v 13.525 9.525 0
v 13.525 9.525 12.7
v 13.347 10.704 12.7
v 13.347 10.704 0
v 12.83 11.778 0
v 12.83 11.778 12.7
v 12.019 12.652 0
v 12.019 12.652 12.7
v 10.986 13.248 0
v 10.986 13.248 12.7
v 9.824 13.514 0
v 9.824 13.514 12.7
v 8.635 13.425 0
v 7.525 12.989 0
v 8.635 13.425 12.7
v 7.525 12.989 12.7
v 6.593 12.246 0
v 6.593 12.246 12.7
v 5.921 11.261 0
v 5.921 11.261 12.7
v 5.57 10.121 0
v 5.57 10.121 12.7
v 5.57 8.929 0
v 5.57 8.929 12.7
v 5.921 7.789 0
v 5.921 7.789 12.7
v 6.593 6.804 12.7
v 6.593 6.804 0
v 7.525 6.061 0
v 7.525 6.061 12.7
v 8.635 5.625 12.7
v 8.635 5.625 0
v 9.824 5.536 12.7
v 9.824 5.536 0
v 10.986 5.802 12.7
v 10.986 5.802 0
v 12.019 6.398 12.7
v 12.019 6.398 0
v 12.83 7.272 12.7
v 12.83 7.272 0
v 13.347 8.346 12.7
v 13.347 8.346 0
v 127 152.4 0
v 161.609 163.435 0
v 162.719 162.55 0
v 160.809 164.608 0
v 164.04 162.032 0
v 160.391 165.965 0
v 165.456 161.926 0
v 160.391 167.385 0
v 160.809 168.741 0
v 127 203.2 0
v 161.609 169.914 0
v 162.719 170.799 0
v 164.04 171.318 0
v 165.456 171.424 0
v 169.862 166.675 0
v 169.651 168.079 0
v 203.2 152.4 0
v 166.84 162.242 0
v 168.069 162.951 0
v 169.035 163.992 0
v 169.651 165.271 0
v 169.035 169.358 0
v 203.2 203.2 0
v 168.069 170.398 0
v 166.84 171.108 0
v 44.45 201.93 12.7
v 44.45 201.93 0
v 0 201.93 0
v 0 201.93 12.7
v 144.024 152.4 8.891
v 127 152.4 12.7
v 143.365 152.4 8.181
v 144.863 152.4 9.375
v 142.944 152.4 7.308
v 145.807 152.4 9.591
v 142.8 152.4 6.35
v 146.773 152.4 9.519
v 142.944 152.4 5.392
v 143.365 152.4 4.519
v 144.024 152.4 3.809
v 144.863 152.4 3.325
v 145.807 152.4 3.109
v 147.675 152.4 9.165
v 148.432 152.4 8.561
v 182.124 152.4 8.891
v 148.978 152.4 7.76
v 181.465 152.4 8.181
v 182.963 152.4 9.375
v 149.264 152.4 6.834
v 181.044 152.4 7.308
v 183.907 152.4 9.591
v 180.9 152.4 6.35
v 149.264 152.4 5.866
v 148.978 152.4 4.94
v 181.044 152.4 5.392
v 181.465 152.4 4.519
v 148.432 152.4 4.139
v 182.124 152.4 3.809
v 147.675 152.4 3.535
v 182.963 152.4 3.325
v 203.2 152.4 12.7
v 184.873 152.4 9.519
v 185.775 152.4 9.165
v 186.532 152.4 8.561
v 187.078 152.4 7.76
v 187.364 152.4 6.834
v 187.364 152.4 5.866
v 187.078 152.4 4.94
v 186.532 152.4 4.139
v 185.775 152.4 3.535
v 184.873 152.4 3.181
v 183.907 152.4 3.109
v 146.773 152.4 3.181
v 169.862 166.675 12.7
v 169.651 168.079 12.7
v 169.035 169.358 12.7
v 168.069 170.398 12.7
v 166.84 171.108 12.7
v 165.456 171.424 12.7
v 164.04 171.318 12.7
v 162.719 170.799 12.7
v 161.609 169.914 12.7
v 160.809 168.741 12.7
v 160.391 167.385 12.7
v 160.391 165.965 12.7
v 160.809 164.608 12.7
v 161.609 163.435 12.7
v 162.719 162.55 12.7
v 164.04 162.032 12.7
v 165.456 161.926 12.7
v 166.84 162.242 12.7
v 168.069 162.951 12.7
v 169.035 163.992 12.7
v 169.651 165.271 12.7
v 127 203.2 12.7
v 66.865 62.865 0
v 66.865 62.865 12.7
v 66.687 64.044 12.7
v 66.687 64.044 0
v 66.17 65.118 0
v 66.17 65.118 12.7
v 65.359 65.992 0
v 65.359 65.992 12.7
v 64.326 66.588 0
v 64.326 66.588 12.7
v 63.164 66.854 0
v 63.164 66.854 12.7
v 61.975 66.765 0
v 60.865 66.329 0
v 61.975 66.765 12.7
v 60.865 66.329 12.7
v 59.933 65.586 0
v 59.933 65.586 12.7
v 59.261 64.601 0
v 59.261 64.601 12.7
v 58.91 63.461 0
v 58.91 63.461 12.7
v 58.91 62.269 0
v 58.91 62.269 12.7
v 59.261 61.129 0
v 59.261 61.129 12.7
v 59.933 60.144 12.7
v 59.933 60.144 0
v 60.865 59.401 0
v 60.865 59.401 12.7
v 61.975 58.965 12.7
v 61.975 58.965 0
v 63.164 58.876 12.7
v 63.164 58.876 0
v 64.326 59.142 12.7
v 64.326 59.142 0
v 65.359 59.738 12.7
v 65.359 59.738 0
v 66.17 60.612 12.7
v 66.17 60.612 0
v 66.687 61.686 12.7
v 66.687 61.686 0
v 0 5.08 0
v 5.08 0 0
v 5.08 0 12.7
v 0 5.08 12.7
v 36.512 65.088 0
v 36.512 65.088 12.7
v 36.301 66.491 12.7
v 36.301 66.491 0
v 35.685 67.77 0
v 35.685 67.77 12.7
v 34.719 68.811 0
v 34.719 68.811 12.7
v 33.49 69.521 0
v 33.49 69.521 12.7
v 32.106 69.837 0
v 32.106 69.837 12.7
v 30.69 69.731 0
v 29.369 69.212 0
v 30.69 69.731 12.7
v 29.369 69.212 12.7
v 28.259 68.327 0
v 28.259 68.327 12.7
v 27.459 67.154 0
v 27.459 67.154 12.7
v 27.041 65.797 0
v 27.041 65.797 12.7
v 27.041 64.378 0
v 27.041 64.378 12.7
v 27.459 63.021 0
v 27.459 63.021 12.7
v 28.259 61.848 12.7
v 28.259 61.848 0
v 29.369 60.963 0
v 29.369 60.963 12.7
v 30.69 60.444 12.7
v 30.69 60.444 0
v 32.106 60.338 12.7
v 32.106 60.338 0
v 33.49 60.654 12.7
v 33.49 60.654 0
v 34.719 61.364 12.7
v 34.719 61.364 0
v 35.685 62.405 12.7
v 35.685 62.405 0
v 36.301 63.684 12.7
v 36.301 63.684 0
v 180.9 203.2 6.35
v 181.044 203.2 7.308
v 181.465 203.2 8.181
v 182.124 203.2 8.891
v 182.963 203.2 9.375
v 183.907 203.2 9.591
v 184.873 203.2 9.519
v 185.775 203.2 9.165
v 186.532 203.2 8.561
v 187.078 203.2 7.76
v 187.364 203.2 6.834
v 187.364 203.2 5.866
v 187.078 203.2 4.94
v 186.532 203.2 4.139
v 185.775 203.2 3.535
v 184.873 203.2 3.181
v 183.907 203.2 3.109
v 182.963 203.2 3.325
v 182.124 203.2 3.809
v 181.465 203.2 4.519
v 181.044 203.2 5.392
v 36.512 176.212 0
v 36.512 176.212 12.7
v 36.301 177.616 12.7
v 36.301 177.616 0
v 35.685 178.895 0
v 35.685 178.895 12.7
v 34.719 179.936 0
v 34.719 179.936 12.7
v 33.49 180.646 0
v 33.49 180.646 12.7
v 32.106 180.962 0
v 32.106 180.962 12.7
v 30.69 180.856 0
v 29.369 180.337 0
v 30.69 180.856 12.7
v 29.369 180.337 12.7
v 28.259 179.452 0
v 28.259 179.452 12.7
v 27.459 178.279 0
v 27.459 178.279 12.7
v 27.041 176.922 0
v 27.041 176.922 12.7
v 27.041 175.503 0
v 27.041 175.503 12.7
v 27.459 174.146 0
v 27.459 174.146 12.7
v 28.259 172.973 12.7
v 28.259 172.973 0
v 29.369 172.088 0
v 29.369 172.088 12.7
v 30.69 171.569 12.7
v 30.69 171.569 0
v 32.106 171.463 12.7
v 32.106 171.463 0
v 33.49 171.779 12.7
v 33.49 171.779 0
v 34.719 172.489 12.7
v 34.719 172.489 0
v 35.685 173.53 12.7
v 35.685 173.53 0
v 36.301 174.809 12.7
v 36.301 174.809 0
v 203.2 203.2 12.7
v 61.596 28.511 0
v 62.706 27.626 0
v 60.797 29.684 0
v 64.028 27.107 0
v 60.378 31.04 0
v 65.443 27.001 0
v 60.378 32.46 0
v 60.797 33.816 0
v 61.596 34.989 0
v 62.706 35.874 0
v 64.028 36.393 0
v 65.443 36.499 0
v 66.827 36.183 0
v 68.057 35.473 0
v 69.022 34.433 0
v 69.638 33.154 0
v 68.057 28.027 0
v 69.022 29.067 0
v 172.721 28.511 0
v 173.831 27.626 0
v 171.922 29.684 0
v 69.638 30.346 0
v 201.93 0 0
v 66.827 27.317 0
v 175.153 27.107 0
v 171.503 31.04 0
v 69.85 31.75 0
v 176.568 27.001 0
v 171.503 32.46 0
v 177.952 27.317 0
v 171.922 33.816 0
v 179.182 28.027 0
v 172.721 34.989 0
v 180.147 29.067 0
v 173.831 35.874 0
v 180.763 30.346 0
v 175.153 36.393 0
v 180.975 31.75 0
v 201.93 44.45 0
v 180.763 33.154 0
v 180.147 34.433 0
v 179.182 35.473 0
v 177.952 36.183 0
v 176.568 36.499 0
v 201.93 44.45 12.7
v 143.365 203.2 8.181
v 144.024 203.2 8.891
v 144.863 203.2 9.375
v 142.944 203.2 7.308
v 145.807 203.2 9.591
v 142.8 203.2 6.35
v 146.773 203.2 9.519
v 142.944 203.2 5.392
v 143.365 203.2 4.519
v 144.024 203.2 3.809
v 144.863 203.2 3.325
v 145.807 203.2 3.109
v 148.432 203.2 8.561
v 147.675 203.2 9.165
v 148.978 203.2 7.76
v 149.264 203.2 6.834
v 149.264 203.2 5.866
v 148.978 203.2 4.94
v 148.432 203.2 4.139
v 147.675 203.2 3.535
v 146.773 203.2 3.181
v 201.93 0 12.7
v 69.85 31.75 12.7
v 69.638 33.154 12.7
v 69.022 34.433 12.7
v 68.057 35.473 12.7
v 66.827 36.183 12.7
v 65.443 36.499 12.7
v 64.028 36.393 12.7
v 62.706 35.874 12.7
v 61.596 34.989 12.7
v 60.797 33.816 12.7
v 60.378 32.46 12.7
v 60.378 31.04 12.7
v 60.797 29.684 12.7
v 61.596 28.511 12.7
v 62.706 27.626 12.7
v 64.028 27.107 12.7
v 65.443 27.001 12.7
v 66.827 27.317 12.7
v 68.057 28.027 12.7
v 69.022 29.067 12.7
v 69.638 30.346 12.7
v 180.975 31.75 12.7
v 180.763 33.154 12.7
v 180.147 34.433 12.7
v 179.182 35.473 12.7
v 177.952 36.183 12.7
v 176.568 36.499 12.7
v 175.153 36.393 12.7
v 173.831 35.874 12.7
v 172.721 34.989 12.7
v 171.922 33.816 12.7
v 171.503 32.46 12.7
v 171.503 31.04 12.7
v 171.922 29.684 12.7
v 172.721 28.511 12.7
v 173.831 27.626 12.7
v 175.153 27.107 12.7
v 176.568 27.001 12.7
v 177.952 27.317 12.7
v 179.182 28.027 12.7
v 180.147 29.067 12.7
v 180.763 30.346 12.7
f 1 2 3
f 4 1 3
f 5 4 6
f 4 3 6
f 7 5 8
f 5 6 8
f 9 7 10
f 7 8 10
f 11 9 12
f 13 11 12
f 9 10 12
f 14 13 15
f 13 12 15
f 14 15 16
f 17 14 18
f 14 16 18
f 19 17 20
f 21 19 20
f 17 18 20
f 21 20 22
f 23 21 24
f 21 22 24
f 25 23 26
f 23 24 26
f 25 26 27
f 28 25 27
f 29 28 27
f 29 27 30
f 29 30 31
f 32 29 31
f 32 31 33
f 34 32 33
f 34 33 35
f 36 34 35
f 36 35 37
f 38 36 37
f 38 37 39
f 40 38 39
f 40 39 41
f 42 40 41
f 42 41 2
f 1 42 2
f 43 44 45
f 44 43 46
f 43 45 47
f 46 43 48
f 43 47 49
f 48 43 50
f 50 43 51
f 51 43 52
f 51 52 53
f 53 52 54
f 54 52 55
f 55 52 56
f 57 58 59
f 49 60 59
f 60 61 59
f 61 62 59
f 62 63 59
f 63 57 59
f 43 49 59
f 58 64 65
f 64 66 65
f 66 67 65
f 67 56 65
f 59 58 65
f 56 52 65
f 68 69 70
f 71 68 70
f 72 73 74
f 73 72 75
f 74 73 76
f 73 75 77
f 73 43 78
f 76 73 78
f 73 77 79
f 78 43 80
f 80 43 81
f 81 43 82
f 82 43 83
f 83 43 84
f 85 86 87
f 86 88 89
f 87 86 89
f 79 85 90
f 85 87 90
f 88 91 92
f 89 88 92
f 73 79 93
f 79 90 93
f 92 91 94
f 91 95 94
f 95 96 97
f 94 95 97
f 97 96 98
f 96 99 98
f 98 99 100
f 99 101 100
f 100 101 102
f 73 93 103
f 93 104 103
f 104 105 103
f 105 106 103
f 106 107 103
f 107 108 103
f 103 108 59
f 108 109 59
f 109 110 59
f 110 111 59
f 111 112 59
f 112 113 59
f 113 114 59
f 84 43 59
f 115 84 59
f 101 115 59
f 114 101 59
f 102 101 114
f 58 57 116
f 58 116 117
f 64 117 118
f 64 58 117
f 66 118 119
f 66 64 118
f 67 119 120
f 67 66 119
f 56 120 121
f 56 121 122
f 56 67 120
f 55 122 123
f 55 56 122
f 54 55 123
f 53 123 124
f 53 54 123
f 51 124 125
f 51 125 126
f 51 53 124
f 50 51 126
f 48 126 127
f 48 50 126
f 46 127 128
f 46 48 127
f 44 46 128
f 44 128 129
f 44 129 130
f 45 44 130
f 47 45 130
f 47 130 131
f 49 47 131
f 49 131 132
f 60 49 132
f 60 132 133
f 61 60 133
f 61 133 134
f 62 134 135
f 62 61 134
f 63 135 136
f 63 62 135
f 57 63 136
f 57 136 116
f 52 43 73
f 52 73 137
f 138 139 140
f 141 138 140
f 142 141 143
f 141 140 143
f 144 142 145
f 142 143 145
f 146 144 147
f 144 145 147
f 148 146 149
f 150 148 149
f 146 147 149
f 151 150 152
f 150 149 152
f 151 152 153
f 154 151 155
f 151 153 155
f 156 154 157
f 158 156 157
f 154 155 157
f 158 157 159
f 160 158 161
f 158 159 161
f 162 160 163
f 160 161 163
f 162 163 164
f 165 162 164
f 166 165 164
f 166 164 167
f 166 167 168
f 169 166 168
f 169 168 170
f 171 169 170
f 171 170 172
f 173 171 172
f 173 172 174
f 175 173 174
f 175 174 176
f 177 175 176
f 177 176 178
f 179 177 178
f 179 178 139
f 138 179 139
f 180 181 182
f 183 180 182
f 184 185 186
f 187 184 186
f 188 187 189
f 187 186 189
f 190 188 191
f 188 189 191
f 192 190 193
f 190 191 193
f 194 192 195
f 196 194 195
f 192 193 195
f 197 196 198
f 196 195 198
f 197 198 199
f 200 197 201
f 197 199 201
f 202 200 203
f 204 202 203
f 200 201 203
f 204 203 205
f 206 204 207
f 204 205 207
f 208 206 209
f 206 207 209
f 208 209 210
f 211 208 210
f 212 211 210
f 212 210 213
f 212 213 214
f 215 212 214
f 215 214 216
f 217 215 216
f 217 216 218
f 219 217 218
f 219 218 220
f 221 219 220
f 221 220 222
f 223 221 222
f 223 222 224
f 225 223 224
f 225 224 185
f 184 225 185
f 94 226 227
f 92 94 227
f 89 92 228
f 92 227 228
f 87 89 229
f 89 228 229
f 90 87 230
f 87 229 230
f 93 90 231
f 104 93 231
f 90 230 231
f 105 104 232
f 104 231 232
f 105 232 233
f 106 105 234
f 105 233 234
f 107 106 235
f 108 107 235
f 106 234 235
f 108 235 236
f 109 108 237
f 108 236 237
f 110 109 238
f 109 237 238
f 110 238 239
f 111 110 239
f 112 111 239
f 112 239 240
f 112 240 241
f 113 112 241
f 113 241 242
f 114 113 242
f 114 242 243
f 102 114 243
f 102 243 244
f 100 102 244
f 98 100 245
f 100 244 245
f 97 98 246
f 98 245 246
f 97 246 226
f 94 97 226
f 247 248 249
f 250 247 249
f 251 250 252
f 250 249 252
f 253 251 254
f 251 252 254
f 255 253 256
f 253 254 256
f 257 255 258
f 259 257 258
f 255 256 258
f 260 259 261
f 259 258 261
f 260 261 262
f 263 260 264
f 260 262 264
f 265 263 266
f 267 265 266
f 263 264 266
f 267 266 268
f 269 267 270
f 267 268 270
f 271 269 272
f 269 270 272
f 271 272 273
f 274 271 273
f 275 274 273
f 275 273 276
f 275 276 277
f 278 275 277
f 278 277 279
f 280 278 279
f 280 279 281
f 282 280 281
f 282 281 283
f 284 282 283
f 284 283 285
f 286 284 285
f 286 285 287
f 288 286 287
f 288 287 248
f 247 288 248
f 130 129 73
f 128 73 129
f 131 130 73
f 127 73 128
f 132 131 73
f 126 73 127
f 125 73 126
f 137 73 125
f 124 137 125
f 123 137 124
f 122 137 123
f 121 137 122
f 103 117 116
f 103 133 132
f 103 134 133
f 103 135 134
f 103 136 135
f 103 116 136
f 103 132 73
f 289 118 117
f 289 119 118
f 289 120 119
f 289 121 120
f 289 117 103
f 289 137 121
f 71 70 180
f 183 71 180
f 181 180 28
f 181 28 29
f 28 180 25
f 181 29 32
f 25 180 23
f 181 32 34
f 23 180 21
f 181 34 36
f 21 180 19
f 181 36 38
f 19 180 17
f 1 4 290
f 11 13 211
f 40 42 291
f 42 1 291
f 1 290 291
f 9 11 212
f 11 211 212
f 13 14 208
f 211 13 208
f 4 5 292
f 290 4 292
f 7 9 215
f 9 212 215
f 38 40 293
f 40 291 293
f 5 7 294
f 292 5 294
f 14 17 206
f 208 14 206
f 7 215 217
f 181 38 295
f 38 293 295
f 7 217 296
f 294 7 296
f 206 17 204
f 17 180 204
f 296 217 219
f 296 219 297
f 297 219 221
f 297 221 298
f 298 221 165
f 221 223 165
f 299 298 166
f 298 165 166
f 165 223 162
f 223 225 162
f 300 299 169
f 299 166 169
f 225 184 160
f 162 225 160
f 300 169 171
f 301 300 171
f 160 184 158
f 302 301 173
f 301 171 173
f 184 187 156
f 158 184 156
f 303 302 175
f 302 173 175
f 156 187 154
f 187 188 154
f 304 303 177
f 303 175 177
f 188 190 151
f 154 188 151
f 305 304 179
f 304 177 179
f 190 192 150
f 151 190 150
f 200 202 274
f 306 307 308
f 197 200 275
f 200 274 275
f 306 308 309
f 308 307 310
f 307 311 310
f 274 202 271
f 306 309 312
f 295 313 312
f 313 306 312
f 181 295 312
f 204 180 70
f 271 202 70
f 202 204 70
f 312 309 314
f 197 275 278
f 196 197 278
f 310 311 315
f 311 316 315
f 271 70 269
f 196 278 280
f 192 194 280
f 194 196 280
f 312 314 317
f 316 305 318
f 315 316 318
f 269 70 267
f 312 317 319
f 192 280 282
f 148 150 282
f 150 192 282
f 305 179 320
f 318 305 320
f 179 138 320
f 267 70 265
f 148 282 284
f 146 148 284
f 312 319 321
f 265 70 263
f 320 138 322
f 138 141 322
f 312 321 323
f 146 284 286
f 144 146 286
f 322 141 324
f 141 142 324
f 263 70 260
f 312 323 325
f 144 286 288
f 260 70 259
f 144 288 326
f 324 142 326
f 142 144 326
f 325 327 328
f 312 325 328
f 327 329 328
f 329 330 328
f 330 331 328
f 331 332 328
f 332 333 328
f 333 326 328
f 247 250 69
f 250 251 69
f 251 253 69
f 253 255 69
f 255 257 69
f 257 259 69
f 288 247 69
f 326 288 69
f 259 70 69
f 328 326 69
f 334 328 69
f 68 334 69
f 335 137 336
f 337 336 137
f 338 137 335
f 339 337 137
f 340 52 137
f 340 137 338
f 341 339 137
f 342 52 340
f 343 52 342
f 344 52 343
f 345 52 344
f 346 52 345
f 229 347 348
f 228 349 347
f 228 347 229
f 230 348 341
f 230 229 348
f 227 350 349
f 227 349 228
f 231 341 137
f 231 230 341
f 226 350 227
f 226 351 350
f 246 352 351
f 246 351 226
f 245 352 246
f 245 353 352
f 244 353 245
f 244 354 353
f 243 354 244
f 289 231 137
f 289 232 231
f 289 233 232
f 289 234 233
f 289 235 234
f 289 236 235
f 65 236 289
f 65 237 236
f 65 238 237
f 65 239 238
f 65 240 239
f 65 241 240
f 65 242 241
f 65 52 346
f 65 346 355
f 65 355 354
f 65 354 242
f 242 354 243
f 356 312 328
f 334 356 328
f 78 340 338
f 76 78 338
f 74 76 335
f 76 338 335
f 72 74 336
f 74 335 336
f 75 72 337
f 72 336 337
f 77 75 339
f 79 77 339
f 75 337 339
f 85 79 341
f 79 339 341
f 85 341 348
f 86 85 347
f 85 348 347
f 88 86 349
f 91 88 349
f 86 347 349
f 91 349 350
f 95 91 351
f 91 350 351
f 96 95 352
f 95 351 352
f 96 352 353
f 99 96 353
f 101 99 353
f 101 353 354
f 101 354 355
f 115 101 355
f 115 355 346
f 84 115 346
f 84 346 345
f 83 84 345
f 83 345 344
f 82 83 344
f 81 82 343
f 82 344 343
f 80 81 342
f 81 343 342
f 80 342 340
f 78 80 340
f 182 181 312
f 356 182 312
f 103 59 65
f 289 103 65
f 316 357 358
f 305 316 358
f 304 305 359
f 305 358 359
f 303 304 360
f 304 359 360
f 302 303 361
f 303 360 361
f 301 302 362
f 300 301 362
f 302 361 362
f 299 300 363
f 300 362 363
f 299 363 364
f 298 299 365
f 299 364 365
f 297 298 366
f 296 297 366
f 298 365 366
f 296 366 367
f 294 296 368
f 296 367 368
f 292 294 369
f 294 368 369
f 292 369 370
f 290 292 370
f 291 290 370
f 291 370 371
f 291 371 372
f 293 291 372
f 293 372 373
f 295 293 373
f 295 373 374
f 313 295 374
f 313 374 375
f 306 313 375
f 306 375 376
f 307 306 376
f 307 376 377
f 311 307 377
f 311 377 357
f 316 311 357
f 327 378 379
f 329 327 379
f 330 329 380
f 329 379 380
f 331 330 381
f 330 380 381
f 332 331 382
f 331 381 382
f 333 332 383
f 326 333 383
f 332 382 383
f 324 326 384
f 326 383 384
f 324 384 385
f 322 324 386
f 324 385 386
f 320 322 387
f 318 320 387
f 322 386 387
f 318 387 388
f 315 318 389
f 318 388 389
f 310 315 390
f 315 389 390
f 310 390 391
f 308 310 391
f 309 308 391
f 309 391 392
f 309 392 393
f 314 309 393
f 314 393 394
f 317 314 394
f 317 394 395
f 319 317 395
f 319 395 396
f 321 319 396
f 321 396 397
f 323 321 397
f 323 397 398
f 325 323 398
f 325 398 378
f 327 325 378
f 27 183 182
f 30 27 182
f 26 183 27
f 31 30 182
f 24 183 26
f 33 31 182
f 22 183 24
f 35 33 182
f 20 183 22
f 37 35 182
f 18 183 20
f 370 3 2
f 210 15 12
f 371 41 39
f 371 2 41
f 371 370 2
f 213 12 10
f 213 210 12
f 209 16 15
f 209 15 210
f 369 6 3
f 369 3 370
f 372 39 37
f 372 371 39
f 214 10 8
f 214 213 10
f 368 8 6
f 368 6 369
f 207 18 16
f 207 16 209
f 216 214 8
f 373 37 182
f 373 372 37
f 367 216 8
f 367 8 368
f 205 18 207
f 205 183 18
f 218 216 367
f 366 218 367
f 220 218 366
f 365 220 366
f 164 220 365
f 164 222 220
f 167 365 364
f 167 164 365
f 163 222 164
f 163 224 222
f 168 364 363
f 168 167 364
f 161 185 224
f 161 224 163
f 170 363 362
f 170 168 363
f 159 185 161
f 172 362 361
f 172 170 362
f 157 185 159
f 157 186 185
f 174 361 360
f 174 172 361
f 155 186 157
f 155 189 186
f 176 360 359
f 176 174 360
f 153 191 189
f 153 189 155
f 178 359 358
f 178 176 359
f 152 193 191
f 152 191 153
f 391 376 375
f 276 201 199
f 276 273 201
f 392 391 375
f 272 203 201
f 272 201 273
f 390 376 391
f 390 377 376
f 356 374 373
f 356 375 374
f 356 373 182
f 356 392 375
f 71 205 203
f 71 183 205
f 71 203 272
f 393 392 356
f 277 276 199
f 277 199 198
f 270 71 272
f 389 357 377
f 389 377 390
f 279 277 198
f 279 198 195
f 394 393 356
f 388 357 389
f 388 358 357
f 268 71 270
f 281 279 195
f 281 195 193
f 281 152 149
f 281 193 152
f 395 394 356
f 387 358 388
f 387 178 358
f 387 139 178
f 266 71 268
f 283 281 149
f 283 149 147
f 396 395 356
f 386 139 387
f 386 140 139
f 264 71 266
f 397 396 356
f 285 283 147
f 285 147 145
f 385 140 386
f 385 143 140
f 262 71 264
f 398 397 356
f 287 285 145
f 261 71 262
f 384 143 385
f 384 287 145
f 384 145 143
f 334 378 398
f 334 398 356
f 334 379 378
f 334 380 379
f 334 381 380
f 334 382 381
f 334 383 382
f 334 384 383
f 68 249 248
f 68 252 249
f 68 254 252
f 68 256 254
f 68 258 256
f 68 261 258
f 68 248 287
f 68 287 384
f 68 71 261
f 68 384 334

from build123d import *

# Parameters (mm, degrees)
F1_DEPTH  = 12.7
F2_R      = 4.7625
F2_R_2    = 4
F3_DEPTH  = 12.701
F4_SIZE   = 5.08
F7_DEPTH  = 12.7
F8_R      = 4
F9_DEPTH  = 14.942283
F11_W     = 76.2
F11_H     = 50.8
F11_R     = 4.7625
F12_DEPTH = 12.7
F13_R     = 3.25
F14_DEPTH = 50.8


with BuildPart() as f1:
    # F0 (on Top) → F1 (new body)
    with BuildSketch(Plane.XY):
        Polygon((0, 201.93), (0, 0), (201.93, 0), (201.93, 44.45), (44.45, 201.93), align=None)
    extrude(amount=F1_DEPTH)

    # F2 (on face) → F3 (cut, through all)
    with BuildSketch(Plane.XY.offset(12.7)):
        with Locations((65.0875, 31.75)):
            Circle(F2_R)
        with Locations((176.2125, 31.75)):
            Circle(F2_R)
        with Locations((31.75, 176.2125)):
            Circle(F2_R)
        with Locations((31.75, 65.0875)):
            Circle(F2_R)
        with Locations((9.525, 9.525)):
            Circle(F2_R_2)
        with Locations((62.865, 62.865)):
            Circle(F2_R_2)
    extrude(amount=-F3_DEPTH, mode=Mode.SUBTRACT)

    # F4
    f4_edges = [f1.edges().sort_by_distance(p)[0] for p in [
        (0, 0, 6.35),
    ]]
    chamfer(f4_edges, length=F4_SIZE)


with BuildPart() as f7:
    # F6 (on Top) → F7 (new body)
    with BuildSketch(Plane.XY):
        with BuildLine():
            Line((203.2, 203.2), (127, 203.2))
            Line((127, 203.2), (127, 190.5))
            Line((127, 190.5), (177.8, 190.5))
            ThreePointArc((177.8, 190.5), (186.780256, 186.780256), (190.5, 177.8))
            Line((190.5, 177.8), (190.5, 127))
            Line((190.5, 127), (203.2, 127))
            Line((203.2, 127), (203.2, 203.2))
        make_face()
    extrude(amount=F7_DEPTH)

    # F8 (on face) → F9 (cut, through all)
    with BuildSketch(Plane.YZ.offset(203.2)):
        with Locations((185.00598, 6.35)):
            Circle(F8_R)
        with Locations((166.6748, 6.35)):
            Circle(F8_R)
    extrude(amount=-F9_DEPTH, mode=Mode.SUBTRACT)


with BuildPart() as f12:
    # F11 (on face) → F12 (new body)
    with BuildSketch(Plane.XY):
        with Locations((165.1, 177.8)):
            Rectangle(F11_W, F11_H)
        with Locations((165.1, 166.6748)):
            Circle(F11_R, mode=Mode.SUBTRACT)
    extrude(amount=F12_DEPTH)

    # F13 (on face) → F14 (cut, through all)
    with BuildSketch(Plane(origin=(0, 203.2, 0), x_dir=(-1, 0, 0), z_dir=(0, 1, 0))):
        with Locations((-184.15, 6.35)):
            Circle(F13_R)
        with Locations((-146.05, 6.35)):
            Circle(F13_R)
    extrude(amount=-F14_DEPTH, mode=Mode.SUBTRACT)


solid = Compound([f1.part, f12.part])
